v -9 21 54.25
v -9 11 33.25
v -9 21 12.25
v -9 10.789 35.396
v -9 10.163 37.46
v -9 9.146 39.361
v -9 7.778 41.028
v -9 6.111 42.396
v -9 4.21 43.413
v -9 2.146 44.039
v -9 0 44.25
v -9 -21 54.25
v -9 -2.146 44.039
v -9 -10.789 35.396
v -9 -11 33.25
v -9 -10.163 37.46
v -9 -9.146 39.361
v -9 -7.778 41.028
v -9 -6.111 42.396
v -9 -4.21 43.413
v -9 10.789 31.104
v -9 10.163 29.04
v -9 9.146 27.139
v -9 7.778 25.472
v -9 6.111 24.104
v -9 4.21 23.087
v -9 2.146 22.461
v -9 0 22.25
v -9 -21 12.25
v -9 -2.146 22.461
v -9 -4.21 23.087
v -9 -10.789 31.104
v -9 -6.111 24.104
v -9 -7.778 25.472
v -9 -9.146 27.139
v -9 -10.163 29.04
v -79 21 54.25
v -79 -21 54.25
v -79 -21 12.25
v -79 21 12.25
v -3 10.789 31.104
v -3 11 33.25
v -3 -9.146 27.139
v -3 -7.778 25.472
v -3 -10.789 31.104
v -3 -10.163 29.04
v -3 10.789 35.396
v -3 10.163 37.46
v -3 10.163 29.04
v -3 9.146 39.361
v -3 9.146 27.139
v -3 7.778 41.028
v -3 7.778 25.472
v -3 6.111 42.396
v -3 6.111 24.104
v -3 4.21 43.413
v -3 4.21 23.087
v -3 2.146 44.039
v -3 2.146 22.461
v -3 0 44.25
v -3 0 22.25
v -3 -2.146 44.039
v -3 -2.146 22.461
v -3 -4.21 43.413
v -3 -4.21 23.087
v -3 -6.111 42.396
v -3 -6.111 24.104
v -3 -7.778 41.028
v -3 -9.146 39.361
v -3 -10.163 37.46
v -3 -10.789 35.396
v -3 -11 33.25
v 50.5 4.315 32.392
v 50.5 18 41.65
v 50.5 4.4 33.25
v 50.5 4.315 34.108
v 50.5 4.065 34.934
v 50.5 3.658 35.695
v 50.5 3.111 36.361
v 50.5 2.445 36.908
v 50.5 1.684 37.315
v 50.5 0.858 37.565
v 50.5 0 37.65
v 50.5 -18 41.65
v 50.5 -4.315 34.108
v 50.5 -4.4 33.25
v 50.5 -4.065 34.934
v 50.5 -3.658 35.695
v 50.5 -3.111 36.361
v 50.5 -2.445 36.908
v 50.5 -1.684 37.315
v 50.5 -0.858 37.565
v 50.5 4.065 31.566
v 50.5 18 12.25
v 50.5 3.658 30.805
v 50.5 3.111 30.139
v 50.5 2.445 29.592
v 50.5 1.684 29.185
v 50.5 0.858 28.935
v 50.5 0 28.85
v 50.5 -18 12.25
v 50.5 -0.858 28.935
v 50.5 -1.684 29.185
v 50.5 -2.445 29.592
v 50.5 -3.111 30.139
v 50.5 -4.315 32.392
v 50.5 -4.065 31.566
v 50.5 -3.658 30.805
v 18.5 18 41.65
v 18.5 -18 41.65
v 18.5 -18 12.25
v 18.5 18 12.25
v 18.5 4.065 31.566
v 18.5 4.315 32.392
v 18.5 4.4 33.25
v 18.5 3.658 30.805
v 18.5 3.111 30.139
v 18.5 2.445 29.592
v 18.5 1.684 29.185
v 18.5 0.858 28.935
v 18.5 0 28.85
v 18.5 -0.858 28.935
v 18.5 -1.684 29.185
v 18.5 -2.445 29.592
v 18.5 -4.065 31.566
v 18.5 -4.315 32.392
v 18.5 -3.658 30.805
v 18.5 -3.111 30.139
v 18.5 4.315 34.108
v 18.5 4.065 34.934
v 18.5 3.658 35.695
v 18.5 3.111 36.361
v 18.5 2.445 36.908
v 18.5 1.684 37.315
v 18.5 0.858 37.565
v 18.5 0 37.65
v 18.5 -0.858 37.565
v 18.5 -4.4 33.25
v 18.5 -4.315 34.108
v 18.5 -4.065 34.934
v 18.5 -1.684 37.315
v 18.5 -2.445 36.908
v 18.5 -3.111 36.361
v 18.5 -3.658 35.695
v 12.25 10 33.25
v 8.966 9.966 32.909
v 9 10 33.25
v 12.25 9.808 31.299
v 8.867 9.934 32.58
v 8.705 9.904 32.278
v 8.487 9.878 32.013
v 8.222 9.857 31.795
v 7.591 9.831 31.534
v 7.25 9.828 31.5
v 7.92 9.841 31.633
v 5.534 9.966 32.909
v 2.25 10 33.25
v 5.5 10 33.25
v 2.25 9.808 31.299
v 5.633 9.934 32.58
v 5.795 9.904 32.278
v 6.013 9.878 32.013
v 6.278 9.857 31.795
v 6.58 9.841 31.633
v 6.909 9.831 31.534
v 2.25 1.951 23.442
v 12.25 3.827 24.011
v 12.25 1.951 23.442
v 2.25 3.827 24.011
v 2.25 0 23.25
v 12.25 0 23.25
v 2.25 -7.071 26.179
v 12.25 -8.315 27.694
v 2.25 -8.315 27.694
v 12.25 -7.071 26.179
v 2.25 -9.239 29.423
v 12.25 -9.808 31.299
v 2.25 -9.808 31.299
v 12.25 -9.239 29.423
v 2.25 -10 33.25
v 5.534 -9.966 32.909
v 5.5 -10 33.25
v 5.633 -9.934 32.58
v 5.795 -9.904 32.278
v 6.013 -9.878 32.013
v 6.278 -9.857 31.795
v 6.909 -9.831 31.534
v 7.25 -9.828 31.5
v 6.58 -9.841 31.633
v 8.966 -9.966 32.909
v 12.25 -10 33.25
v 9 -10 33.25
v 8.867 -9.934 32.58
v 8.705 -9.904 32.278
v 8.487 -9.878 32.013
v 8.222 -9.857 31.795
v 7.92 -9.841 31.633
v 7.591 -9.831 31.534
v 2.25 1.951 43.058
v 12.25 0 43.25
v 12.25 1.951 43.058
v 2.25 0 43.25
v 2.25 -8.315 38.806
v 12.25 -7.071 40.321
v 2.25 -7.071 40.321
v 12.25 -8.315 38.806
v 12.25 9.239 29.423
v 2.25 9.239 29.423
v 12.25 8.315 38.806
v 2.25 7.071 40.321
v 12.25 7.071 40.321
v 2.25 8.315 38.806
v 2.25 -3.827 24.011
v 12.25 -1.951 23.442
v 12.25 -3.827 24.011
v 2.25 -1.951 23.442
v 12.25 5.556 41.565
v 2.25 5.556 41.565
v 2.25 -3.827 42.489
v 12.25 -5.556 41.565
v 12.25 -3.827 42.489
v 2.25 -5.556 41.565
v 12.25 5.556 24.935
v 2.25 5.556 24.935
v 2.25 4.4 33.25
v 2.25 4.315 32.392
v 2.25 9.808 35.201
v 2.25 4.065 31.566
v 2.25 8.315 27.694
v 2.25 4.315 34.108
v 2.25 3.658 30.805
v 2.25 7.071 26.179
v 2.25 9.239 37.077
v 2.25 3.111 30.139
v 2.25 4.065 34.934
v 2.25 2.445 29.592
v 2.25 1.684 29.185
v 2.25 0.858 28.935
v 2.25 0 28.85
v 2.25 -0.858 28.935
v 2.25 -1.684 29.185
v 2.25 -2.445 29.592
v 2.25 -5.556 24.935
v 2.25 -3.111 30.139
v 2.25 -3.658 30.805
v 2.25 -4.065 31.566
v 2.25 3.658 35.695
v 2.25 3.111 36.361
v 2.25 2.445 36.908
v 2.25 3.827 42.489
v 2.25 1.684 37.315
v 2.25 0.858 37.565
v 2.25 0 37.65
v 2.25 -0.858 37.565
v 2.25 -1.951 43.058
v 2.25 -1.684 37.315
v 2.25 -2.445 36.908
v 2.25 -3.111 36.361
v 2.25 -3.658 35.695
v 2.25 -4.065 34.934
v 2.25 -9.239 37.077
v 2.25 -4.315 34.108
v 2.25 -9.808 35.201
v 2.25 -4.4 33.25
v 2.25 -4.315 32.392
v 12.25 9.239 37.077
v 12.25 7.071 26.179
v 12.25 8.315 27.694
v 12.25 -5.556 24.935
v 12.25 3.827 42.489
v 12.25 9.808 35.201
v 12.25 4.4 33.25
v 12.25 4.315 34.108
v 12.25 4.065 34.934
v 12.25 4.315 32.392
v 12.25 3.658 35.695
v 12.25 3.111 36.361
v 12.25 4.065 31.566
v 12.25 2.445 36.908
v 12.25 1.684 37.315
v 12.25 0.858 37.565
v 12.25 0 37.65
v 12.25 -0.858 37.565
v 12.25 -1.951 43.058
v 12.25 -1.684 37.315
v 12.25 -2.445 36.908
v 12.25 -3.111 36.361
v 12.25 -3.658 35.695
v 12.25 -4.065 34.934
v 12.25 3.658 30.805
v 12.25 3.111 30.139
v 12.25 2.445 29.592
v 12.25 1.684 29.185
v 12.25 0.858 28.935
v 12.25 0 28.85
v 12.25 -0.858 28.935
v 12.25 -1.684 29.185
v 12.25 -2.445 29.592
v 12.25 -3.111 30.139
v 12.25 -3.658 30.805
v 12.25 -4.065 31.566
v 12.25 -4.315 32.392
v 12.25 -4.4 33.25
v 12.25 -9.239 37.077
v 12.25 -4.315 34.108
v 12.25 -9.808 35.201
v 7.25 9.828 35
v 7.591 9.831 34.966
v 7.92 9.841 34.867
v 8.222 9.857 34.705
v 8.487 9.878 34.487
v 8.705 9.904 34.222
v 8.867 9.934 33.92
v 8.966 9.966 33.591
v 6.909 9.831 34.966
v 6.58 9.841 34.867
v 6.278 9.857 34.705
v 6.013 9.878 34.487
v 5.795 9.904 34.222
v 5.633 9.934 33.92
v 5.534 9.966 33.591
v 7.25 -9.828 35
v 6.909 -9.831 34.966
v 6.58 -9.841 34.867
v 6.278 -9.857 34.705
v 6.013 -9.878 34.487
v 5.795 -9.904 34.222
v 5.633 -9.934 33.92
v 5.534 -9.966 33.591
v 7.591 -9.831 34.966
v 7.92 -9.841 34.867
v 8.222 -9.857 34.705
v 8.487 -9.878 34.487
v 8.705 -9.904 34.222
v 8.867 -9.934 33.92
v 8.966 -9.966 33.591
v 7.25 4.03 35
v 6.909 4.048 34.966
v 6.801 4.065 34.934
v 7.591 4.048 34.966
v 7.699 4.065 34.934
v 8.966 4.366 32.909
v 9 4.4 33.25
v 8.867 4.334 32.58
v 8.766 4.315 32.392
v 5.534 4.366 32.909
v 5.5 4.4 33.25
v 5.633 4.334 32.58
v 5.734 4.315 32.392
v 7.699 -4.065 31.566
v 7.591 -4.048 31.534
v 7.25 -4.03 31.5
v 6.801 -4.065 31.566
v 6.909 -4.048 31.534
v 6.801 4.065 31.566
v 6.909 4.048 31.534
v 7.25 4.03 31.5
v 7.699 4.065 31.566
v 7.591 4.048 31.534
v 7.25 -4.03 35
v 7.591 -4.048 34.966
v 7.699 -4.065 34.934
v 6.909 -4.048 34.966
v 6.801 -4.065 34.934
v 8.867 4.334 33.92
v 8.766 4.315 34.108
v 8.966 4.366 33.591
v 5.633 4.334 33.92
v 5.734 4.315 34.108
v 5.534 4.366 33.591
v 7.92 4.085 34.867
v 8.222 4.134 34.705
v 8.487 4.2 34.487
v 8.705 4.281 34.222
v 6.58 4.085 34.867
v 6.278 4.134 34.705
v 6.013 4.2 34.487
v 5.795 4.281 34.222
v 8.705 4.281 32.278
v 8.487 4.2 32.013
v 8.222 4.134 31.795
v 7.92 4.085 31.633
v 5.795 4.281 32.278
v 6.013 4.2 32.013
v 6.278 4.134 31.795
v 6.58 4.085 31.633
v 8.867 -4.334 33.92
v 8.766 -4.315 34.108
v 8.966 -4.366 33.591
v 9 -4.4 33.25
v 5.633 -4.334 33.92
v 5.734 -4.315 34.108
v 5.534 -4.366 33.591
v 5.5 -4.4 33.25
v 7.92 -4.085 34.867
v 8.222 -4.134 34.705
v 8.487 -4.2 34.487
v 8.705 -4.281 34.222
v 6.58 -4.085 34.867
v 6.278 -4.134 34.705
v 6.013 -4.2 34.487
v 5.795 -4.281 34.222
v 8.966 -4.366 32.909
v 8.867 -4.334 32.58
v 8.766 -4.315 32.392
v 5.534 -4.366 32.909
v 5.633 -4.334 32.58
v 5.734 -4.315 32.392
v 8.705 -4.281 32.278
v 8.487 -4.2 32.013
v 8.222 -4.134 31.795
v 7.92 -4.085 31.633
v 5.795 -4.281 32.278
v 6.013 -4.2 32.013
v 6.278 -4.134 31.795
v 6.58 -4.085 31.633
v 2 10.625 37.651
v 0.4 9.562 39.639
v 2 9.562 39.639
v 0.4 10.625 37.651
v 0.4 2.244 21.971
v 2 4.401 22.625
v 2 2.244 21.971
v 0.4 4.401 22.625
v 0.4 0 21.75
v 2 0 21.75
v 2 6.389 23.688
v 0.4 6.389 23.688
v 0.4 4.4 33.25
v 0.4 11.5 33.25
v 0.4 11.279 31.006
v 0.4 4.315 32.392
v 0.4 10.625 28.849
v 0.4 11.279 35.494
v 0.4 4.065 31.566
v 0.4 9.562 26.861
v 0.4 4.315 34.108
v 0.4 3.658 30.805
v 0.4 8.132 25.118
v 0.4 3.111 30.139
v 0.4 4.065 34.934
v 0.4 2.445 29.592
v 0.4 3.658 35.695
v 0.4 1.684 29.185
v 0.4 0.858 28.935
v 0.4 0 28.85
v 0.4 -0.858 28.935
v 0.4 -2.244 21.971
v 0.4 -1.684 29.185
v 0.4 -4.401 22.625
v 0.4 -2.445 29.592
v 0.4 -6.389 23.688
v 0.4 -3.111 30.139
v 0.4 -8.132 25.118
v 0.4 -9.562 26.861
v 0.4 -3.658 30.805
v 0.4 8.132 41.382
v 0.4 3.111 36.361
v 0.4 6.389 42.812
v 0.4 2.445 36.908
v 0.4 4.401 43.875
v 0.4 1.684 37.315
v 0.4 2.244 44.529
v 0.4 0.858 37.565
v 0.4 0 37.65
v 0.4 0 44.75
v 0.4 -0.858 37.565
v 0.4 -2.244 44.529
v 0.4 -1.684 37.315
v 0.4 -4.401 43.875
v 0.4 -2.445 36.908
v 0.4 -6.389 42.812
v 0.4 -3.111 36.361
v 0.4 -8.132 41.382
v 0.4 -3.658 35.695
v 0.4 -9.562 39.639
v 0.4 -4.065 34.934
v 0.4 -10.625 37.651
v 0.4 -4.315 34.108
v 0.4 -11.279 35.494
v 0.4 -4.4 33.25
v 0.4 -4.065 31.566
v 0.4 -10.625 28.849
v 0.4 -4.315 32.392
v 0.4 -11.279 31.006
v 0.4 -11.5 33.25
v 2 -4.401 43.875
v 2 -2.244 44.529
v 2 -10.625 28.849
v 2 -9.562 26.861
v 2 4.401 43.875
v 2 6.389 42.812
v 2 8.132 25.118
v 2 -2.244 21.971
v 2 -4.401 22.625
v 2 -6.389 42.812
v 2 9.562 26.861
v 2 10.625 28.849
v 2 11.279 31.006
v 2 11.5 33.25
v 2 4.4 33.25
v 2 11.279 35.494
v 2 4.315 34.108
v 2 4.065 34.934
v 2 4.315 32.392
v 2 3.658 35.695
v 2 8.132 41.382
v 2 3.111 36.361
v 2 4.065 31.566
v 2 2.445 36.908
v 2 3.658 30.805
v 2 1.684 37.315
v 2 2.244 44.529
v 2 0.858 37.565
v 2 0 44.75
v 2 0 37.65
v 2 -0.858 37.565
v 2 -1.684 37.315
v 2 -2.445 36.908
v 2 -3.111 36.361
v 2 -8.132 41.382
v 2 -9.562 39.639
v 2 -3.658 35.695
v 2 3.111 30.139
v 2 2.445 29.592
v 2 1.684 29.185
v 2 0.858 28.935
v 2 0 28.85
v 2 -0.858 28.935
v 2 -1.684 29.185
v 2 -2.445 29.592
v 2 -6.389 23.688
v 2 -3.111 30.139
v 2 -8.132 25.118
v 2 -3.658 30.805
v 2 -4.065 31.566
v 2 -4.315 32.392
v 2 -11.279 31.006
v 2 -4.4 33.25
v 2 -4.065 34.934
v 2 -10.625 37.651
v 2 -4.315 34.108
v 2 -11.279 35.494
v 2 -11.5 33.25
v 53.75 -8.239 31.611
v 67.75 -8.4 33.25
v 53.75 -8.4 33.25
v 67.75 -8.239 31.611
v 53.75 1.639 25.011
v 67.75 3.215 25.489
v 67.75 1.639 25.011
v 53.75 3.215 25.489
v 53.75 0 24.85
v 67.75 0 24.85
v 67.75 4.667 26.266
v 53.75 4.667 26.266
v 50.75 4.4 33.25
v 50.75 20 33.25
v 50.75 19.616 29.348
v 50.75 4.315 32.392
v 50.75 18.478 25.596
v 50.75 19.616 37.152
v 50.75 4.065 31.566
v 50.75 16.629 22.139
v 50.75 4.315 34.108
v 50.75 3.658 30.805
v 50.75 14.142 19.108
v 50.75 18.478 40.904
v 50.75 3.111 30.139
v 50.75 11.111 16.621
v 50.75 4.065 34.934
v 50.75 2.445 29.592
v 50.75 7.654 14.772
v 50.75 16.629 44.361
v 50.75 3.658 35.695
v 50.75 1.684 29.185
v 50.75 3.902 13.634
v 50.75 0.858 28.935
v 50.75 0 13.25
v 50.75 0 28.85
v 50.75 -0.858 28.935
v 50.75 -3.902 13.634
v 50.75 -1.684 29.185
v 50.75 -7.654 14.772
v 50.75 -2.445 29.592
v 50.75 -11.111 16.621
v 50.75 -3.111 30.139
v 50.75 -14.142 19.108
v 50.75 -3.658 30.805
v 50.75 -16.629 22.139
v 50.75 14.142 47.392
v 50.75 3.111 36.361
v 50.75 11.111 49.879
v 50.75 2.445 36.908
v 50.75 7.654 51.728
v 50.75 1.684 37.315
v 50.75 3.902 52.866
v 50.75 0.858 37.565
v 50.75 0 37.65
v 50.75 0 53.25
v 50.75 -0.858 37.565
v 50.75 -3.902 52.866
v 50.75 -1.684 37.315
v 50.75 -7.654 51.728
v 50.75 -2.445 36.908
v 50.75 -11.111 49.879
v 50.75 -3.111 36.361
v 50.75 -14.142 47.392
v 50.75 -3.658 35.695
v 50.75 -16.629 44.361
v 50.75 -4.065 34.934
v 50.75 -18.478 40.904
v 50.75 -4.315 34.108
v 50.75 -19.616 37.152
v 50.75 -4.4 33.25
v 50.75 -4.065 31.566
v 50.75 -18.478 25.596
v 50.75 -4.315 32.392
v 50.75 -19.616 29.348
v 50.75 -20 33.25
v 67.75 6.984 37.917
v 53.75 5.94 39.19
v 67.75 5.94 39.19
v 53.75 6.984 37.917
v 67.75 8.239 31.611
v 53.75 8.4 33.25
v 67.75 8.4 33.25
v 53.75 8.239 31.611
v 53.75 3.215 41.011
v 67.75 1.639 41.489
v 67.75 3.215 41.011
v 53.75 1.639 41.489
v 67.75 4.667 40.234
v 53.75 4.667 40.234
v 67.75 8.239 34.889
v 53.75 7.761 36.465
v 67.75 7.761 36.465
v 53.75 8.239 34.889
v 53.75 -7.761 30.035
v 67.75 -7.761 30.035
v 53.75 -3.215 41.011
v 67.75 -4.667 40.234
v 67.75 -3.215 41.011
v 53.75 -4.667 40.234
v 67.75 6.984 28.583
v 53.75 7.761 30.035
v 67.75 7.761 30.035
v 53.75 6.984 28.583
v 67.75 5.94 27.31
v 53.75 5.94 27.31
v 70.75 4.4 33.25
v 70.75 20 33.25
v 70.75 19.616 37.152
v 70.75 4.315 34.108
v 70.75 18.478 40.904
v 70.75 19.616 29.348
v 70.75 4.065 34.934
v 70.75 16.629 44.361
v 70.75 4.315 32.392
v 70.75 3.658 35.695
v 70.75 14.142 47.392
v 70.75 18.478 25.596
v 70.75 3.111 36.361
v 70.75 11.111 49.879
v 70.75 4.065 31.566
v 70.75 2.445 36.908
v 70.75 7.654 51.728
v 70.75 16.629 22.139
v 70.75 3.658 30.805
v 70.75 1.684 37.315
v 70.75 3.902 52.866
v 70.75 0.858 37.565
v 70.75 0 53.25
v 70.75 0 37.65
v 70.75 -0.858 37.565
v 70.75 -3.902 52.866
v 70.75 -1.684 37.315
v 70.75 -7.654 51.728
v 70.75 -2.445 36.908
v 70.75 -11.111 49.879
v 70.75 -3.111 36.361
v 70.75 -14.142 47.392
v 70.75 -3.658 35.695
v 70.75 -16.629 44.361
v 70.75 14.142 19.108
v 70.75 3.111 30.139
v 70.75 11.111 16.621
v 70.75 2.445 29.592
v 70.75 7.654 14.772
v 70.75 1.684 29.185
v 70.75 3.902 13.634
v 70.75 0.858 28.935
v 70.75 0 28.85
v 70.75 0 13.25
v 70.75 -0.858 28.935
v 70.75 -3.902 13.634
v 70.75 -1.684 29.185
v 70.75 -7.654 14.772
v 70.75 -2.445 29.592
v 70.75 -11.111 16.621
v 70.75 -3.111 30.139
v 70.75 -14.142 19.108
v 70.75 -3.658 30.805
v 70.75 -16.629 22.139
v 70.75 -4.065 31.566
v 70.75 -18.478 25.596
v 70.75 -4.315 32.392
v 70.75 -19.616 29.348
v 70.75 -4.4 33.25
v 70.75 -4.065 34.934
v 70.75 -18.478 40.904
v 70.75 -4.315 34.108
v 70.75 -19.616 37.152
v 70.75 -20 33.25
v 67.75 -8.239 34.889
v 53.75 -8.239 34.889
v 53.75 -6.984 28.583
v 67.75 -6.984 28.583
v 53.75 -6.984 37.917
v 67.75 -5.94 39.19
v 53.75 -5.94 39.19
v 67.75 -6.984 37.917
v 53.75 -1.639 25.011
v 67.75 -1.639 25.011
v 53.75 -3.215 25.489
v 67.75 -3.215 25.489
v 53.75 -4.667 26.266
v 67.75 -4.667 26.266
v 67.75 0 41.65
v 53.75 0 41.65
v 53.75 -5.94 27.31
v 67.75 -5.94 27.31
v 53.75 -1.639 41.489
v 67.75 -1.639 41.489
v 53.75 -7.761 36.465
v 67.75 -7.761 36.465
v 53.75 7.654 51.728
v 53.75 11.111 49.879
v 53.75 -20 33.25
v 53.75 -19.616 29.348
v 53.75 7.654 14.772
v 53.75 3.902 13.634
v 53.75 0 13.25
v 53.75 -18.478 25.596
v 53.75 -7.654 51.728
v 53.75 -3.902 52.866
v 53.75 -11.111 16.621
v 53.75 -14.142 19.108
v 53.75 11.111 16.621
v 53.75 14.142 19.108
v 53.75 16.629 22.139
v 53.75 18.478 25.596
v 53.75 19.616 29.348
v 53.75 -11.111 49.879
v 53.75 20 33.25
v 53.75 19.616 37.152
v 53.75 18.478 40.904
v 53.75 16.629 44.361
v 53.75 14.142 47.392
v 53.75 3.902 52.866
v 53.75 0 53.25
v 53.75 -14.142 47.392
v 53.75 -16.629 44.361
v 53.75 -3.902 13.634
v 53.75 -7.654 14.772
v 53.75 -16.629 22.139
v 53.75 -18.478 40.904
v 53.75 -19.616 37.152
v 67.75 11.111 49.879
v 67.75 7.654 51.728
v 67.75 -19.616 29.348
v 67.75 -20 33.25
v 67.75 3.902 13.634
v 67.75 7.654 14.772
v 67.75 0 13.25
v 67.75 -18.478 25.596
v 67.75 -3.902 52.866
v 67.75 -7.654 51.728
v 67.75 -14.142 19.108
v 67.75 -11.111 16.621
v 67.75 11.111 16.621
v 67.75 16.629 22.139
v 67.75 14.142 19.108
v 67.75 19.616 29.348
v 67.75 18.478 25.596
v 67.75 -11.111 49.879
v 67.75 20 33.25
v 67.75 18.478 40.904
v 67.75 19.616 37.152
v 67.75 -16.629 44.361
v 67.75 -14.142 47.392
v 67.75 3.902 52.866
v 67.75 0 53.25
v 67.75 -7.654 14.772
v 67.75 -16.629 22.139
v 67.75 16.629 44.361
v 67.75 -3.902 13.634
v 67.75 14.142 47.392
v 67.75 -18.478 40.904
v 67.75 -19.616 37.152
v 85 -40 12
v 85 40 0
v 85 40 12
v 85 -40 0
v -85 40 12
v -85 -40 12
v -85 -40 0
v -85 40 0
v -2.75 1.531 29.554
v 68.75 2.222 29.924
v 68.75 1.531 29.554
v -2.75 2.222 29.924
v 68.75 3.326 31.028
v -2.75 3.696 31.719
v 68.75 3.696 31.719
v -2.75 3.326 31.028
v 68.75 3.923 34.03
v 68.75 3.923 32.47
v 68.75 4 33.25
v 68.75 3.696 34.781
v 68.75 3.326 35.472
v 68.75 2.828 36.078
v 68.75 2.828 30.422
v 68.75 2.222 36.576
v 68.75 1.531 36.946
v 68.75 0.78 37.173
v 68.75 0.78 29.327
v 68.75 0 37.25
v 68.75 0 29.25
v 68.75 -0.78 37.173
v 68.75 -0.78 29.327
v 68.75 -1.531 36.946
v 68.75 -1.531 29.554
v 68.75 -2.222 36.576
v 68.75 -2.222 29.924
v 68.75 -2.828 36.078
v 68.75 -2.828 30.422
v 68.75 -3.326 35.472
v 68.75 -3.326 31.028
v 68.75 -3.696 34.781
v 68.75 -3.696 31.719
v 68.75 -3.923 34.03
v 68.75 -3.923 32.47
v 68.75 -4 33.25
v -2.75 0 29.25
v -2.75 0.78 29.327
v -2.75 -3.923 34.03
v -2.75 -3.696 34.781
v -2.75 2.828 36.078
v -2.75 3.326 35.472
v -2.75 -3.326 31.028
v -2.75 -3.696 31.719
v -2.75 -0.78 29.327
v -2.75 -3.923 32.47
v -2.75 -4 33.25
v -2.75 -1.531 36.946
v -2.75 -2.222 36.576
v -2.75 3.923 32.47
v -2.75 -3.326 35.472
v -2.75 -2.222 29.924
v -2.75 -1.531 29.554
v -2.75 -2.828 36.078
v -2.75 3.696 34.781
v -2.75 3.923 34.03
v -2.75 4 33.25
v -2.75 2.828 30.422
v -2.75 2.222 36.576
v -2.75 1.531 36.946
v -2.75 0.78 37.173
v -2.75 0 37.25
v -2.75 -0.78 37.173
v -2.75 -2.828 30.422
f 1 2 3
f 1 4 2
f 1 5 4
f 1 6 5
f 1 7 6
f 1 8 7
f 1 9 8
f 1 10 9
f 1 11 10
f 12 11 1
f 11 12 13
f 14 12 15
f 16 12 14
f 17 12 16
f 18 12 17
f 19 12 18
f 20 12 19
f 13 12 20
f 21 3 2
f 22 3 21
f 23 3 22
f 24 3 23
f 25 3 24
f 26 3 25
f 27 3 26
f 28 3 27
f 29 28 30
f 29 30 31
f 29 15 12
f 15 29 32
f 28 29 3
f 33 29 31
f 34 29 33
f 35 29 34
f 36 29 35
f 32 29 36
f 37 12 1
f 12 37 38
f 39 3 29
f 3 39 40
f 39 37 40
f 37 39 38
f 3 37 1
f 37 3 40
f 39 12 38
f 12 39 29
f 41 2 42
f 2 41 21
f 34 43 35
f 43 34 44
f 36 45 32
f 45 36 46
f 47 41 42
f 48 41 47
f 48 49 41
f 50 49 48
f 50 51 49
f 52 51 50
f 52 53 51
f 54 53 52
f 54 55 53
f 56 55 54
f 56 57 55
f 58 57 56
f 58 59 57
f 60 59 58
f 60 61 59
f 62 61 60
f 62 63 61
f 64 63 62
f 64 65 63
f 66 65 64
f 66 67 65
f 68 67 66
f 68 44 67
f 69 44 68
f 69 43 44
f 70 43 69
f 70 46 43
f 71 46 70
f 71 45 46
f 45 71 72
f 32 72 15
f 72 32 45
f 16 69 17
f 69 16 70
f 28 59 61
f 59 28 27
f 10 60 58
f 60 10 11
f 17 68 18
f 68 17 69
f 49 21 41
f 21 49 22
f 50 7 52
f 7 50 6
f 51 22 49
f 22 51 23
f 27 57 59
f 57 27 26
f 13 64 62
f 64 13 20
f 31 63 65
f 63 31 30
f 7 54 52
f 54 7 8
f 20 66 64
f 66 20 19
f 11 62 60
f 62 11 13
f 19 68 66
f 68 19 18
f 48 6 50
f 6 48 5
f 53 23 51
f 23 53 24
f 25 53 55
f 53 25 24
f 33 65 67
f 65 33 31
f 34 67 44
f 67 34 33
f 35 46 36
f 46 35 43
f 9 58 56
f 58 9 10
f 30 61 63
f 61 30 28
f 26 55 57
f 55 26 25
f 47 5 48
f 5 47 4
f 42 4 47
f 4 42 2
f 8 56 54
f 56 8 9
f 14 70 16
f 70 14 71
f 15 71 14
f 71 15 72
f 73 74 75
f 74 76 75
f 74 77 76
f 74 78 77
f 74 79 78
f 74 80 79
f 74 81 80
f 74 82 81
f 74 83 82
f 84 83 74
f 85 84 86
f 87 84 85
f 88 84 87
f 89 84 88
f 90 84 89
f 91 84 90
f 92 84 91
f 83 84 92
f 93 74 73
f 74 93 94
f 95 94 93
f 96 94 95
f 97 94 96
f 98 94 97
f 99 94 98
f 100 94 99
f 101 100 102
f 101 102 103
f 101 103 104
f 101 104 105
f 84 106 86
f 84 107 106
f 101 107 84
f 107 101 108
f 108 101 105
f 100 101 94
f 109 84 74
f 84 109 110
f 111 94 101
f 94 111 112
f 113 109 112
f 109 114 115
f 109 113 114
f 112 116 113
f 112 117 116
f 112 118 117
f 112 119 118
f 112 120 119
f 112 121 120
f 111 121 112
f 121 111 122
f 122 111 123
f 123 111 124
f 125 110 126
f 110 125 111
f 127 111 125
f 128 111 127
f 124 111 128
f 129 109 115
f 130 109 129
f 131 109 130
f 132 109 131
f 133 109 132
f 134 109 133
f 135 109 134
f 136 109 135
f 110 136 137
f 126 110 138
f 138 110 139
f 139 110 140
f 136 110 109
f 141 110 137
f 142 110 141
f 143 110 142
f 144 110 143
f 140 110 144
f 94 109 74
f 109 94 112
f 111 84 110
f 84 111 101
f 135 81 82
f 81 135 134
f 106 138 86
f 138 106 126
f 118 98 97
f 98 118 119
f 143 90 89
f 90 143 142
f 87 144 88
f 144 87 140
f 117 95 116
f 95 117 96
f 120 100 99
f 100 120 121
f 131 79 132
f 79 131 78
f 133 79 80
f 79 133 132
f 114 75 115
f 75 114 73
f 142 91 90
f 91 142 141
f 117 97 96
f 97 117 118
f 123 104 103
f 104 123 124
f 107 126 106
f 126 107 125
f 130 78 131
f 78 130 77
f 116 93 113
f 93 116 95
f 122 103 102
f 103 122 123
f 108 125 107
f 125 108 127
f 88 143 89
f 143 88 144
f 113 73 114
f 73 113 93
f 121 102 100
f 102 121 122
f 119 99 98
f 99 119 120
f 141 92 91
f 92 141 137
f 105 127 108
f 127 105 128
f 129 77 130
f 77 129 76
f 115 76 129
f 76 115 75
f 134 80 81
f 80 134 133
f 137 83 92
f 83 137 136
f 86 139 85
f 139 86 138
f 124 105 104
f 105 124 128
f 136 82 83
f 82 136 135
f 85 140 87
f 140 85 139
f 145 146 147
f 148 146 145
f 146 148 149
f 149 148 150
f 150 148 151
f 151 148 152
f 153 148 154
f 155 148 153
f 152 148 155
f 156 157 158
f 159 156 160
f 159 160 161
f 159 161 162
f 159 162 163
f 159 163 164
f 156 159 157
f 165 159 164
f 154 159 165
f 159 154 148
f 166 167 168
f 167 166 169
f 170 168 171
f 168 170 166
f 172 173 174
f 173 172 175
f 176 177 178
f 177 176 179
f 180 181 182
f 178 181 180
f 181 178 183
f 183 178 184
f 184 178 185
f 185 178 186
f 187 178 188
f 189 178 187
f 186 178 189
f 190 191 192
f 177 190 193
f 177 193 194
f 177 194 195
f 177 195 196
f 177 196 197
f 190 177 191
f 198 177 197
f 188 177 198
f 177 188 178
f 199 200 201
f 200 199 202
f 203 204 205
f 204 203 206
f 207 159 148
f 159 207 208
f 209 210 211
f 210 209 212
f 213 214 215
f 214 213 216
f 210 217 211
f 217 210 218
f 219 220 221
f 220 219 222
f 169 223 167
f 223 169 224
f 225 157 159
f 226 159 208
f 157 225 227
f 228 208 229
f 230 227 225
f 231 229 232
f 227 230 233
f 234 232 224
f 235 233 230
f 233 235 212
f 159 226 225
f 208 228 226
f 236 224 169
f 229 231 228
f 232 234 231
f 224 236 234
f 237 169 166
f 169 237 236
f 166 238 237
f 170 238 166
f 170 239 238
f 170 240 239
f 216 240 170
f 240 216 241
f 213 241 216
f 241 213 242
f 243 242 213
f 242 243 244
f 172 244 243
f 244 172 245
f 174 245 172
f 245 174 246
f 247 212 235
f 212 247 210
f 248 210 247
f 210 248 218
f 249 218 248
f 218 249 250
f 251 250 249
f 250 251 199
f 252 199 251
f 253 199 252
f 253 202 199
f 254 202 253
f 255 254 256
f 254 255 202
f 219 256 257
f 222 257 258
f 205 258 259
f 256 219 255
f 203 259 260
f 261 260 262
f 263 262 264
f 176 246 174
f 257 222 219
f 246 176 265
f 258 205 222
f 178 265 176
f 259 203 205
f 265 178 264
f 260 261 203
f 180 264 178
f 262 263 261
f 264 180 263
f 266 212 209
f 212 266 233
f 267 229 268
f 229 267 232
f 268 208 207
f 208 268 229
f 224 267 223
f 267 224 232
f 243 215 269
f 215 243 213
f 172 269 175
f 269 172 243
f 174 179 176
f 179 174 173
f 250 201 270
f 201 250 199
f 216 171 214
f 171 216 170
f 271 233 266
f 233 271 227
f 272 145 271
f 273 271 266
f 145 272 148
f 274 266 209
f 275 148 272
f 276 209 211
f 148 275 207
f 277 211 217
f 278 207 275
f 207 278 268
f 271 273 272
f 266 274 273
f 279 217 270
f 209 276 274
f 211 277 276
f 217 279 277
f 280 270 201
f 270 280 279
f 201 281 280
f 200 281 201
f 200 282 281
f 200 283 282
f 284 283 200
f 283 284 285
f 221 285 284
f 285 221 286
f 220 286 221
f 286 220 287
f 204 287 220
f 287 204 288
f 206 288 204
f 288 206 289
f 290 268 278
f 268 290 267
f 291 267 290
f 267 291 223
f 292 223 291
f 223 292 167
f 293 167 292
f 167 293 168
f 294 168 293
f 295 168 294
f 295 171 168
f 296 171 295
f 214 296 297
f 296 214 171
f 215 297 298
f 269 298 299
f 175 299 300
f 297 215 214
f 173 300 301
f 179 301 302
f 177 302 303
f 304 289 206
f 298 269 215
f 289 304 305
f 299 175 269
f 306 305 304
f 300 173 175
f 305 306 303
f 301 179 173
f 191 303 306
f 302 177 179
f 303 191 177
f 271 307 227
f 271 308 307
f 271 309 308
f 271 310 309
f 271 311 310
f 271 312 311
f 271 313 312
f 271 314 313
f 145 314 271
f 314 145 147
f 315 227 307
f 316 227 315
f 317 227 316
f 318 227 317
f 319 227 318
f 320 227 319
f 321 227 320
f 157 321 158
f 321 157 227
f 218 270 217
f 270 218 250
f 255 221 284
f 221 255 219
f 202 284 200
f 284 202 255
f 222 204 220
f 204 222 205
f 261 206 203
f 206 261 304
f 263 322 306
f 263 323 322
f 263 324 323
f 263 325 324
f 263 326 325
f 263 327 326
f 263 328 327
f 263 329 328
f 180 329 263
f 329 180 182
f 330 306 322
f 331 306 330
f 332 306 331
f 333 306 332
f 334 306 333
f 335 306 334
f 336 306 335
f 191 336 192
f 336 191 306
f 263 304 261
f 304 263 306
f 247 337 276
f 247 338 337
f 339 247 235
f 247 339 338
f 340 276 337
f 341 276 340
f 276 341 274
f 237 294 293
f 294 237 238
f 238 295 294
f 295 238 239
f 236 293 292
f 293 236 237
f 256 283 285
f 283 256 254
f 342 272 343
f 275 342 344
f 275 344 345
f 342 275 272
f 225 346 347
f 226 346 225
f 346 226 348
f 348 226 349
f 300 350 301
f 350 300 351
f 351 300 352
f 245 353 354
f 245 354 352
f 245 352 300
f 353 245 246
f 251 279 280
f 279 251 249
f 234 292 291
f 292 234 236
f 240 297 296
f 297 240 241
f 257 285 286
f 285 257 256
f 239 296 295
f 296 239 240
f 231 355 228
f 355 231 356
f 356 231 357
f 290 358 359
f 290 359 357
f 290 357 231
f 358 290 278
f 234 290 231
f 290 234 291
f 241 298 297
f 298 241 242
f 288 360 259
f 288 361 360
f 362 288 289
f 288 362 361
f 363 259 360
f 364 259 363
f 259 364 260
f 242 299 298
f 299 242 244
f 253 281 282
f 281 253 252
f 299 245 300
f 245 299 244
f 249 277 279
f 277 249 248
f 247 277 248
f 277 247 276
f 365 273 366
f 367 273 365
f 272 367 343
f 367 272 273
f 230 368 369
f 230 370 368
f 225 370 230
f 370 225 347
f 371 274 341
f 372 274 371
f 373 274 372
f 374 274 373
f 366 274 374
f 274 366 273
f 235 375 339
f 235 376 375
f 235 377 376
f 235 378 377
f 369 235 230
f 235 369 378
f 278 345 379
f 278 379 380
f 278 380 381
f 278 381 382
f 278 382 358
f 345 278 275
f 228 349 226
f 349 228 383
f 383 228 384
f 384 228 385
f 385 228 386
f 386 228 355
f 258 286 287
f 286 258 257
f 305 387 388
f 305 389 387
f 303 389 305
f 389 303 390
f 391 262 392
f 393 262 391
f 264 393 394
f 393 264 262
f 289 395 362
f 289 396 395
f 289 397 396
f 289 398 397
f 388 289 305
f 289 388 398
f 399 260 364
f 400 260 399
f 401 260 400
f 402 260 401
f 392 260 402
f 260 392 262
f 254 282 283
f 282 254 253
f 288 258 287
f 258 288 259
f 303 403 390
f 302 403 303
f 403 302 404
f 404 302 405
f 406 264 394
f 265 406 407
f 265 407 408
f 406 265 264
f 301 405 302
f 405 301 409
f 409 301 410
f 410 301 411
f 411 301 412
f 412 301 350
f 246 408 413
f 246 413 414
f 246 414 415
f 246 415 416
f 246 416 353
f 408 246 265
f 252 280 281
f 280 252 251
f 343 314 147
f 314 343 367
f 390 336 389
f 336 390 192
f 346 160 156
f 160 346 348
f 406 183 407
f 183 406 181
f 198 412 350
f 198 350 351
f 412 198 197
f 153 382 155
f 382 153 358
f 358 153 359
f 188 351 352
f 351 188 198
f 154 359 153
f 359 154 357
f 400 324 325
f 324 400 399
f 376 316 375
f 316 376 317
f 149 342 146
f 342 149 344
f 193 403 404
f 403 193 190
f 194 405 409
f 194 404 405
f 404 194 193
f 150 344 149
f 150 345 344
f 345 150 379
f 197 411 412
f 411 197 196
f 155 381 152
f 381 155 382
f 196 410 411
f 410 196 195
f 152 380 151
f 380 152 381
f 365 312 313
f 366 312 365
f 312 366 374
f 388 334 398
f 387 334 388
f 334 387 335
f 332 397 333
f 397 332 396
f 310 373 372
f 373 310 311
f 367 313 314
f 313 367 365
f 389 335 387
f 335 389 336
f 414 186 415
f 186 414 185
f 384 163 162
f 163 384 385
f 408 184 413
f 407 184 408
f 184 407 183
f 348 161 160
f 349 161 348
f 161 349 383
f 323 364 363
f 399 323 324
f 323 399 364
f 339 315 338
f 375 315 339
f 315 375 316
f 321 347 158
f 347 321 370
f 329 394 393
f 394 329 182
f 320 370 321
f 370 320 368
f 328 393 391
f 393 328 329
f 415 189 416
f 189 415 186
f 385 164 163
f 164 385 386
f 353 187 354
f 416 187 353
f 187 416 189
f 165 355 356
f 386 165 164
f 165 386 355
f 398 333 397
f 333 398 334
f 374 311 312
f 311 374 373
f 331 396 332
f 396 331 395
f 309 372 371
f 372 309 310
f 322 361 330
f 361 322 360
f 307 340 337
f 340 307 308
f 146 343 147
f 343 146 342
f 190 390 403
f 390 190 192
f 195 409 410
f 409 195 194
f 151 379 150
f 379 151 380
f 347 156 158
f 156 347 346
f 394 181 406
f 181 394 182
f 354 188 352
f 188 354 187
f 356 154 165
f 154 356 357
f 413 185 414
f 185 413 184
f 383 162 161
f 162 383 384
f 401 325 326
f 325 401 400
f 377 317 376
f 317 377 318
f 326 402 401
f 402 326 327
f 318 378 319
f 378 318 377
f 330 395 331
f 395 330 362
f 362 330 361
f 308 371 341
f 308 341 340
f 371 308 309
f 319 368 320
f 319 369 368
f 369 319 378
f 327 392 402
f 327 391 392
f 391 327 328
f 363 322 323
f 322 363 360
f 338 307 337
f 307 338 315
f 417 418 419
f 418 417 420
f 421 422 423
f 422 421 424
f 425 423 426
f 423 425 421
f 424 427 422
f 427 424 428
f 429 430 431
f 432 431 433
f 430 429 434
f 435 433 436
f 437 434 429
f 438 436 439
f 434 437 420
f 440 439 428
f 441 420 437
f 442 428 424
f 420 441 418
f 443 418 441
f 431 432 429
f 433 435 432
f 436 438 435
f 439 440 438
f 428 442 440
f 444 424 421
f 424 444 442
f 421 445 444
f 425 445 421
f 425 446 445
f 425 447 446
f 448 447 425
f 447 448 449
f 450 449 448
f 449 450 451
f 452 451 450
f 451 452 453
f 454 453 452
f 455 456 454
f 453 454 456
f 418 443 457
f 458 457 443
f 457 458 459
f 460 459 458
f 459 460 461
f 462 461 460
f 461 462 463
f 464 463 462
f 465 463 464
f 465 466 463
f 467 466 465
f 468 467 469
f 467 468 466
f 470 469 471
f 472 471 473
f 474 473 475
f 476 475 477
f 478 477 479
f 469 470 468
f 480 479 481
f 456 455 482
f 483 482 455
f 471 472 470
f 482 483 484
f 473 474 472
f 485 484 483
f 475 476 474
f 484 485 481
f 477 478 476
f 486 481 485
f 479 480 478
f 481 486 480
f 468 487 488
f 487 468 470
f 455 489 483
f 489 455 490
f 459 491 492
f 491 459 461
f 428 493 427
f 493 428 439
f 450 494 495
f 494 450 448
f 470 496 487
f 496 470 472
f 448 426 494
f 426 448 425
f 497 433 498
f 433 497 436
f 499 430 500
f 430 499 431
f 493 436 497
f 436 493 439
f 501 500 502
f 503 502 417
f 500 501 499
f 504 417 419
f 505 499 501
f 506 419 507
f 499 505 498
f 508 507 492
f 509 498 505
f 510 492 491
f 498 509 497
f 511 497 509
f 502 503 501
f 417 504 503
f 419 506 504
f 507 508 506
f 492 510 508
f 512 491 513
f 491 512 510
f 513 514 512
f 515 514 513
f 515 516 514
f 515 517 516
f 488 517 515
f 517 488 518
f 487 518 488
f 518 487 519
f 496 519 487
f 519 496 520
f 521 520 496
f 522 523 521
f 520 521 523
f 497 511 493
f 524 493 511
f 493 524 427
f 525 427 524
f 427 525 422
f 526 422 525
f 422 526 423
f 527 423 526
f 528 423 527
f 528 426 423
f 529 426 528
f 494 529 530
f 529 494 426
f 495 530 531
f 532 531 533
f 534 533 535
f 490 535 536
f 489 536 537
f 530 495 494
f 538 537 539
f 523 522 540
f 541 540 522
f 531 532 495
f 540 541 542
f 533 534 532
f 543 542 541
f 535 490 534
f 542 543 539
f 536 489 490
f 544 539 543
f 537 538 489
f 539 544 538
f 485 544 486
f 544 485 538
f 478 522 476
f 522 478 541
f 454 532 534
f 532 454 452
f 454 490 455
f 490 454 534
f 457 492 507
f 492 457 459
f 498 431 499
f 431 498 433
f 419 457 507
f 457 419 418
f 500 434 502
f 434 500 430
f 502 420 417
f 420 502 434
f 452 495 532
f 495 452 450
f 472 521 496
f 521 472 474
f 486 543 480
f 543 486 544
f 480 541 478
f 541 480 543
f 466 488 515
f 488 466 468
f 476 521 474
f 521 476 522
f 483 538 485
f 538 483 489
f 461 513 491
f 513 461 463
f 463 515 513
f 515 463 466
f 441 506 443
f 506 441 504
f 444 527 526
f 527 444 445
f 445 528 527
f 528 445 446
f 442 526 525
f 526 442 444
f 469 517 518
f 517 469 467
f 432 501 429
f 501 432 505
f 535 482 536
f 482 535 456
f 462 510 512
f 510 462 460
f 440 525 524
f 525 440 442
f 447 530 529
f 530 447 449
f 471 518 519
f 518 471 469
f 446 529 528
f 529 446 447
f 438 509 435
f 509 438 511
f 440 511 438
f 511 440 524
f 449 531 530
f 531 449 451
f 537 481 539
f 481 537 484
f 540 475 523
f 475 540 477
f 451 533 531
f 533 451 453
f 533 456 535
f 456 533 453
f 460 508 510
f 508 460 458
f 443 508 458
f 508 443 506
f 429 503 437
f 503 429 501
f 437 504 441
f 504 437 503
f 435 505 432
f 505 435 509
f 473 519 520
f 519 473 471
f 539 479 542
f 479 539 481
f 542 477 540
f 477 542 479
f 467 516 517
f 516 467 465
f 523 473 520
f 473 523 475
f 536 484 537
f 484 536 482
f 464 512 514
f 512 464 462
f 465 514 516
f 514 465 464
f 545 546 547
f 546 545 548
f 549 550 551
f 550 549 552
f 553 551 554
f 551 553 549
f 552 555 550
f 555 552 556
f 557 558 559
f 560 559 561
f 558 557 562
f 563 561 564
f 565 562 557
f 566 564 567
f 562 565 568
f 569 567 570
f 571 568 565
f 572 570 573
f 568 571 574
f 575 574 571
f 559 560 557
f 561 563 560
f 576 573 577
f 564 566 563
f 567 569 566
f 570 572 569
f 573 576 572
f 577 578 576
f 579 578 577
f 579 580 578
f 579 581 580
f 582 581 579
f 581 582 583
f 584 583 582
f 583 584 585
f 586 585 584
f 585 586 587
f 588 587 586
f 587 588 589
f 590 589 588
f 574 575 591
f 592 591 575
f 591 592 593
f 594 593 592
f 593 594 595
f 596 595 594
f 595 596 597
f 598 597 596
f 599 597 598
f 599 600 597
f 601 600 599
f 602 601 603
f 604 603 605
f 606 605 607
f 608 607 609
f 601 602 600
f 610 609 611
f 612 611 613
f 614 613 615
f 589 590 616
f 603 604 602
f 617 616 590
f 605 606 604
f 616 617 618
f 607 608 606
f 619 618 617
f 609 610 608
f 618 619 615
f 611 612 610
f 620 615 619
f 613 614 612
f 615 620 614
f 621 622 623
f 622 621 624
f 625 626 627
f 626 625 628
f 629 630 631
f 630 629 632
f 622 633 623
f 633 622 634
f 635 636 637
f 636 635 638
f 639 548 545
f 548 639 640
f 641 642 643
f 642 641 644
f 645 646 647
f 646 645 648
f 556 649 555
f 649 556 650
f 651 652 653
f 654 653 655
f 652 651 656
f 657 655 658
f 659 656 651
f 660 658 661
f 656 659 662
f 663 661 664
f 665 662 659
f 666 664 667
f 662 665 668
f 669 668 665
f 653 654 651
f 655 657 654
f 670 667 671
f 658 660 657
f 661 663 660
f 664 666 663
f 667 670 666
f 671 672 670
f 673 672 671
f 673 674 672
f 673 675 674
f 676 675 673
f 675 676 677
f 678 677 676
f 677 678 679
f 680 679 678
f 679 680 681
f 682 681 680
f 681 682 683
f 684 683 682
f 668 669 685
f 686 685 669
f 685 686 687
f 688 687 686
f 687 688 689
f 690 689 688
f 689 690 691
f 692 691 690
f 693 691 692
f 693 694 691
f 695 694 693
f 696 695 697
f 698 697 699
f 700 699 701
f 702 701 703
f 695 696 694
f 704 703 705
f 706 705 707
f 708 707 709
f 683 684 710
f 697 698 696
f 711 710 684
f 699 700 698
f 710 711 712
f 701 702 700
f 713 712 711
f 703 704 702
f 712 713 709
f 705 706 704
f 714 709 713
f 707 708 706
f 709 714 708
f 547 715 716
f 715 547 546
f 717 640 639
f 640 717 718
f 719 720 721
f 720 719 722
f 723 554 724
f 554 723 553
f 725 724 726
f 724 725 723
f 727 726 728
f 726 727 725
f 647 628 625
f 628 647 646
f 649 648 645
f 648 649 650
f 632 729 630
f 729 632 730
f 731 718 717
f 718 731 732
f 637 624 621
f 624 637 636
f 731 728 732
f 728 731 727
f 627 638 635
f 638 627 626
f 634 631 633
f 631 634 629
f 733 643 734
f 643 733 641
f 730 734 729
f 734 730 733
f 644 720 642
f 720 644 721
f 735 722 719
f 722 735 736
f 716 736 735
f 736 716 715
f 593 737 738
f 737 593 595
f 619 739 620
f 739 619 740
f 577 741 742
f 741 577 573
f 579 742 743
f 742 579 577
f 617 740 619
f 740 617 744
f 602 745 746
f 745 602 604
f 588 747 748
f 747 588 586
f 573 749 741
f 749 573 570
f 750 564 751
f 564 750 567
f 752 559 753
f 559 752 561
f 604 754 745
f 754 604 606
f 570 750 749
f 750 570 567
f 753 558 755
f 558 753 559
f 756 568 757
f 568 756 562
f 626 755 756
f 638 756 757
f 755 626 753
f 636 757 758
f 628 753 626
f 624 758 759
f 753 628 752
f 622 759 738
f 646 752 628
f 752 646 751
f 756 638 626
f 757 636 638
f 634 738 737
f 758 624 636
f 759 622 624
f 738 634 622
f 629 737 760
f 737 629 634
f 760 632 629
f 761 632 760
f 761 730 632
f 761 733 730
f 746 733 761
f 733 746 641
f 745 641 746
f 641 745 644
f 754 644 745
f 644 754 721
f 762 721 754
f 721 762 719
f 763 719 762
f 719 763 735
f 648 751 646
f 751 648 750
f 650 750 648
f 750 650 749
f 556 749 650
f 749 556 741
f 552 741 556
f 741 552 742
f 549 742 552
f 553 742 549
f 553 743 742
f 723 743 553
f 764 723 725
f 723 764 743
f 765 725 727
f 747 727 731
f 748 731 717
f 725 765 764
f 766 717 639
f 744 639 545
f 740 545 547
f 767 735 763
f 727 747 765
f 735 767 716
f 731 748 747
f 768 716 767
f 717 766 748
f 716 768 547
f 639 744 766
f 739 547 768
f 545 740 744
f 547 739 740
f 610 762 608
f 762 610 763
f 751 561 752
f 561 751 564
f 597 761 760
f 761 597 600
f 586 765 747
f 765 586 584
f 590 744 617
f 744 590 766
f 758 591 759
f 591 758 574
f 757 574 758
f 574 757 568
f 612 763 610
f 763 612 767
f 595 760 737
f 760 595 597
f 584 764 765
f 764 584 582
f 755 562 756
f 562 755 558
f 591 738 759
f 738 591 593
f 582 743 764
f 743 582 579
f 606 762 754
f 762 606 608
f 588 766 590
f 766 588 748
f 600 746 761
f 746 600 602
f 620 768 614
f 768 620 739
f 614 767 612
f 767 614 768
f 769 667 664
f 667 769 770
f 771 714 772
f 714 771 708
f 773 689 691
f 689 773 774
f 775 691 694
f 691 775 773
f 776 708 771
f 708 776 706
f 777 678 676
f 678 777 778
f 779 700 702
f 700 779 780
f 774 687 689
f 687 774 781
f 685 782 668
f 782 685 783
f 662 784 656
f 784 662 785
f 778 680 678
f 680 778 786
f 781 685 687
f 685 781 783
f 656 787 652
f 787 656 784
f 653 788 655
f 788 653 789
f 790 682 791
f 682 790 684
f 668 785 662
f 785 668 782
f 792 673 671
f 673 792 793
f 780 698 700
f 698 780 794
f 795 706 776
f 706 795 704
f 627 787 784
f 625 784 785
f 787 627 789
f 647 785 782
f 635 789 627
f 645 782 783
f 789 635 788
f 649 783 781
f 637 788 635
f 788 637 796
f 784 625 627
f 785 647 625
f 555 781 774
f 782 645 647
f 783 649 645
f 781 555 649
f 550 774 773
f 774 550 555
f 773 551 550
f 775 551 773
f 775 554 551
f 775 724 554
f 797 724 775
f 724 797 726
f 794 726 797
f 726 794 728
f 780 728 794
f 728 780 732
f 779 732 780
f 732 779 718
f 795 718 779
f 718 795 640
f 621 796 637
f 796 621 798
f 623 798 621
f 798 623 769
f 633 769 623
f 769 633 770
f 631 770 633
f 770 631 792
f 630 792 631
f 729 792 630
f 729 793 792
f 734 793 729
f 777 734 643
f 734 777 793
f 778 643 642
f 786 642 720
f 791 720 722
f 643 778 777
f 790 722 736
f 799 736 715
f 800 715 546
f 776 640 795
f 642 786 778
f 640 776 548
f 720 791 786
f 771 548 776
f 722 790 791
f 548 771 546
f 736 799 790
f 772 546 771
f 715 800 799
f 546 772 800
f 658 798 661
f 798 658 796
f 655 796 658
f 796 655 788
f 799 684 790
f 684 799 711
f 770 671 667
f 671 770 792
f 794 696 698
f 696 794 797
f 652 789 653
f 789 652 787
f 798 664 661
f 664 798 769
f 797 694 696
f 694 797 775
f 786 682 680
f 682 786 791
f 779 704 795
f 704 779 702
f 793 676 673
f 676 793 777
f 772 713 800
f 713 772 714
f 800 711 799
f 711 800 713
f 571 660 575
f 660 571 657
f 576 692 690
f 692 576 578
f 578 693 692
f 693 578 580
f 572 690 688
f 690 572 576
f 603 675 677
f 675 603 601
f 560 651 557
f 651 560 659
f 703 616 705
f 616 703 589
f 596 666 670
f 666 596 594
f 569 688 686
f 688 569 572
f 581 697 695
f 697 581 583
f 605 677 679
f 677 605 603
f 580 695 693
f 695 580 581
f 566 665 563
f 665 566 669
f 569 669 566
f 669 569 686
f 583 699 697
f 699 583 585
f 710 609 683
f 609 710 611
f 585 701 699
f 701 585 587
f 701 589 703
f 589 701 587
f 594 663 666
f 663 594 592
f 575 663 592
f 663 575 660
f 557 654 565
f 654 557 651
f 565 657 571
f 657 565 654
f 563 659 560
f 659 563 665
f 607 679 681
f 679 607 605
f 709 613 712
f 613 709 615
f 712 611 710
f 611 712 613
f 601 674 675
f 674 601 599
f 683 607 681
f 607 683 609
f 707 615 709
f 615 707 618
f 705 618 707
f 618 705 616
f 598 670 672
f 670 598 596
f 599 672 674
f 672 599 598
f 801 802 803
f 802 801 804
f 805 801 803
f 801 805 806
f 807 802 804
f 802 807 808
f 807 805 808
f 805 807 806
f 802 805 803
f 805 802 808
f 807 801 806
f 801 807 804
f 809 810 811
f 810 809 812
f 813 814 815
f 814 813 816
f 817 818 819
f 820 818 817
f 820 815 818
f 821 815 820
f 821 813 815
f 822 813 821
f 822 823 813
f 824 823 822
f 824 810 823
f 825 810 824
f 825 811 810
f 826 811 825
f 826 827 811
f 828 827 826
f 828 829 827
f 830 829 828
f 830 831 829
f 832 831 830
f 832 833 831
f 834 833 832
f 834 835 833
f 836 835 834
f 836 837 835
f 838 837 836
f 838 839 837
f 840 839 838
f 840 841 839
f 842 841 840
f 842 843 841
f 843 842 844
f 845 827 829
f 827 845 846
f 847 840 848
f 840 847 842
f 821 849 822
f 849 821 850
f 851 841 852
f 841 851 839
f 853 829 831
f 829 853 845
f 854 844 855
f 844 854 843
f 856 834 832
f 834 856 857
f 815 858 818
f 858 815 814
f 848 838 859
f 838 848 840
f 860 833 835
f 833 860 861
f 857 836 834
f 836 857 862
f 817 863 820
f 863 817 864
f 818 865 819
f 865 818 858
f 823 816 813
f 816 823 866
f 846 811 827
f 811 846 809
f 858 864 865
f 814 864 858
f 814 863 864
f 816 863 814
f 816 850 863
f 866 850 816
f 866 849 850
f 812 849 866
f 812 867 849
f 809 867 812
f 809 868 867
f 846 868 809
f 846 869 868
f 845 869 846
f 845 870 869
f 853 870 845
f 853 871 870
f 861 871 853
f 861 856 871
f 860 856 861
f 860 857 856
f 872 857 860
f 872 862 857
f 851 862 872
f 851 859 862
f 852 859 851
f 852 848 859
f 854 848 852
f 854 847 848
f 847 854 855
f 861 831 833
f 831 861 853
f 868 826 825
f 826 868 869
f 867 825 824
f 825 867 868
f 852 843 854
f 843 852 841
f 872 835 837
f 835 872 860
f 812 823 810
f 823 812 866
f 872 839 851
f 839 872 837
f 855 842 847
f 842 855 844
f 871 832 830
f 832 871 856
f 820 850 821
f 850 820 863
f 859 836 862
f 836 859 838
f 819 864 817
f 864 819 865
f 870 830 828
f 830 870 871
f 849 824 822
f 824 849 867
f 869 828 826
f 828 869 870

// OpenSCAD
$fn = 32;

// ------------------------------------------------------------------------
// Motor drive station: motor 70 x 42 mm, shaft d8, pulley d40
// Every part is its own module, assembly() places every instance.
// ------------------------------------------------------------------------

// --- part 1 ---
module station_bed() {
  difference() {
    translate([-85, -40, 0]) cube([170, 80, 12]);
  }
}

// --- part 2 ---
module drive_motor() {
  union() {
    translate([-35, -21, 0]) cube([70, 42, 42]);
    translate([38, 0, 21]) rotate([0, 90, 0]) cylinder(h = 6, d = 22, center = true);
  }
}

// --- part 3 ---
module pillow_block() {
  difference() {
    translate([-16, -18, 0]) cube([32, 36, 29.4]);
    translate([0, 0, 21]) rotate([0, 90, 0]) cylinder(h = 34, d = 8.8, center = true);
  }
}

// --- part 4 ---
module drive_shaft() {
  translate([0, 0, -35.75]) cylinder(h = 71.5, d = 8);
}

// --- part 5 ---
module shaft_collar() {
  difference() {
    cylinder(h = 10, d = 20);
    translate([0, 0, -1]) cylinder(h = 12, d = 8.8);
    translate([0, 0, 5]) rotate([90, 0, 0]) cylinder(h = 22, d = 3.5, center = true);
  }
}

// --- part 6 ---
module collar_washer() {
  difference() {
      translate([0, 0, 0]) cylinder(h = 1.6, d = 23);
      translate([0, 0, -1]) cylinder(h = 3.6, d = 8.8);
    }
}

// --- part 7 ---
module drive_pulley() {
  difference() {
    union() {
      cylinder(h = 20, d = 16.8);
      cylinder(h = 3, d = 40);
      translate([0, 0, 17]) cylinder(h = 3, d = 40);
    }
    translate([0, 0, -1]) cylinder(h = 22, d = 8.8);
  }
}

// --- assembly ---
module assembly() {
  color([0.80, 0.24, 0.20]) translate([0, 0, 0]) rotate([0, 0, 0]) station_bed();
  color([0.20, 0.45, 0.75]) translate([-44, 0, 12.25]) rotate([0, 0, 0]) drive_motor();
  color([0.25, 0.62, 0.32]) translate([34.5, 0, 12.25]) rotate([0, 0, 0]) pillow_block();
  color([0.92, 0.70, 0.18]) translate([33, 0, 33.25]) rotate([0, 90, 0]) drive_shaft();
  color([0.58, 0.35, 0.70]) translate([2.25, 0, 33.25]) rotate([0, 90, 0]) shaft_collar();
  color([0.16, 0.66, 0.66]) translate([0.4, 0, 33.25]) rotate([0, 90, 0]) collar_washer();
  color([0.85, 0.48, 0.18]) translate([50.75, 0, 33.25]) rotate([0, 90, 0]) drive_pulley();
}

assembly();
